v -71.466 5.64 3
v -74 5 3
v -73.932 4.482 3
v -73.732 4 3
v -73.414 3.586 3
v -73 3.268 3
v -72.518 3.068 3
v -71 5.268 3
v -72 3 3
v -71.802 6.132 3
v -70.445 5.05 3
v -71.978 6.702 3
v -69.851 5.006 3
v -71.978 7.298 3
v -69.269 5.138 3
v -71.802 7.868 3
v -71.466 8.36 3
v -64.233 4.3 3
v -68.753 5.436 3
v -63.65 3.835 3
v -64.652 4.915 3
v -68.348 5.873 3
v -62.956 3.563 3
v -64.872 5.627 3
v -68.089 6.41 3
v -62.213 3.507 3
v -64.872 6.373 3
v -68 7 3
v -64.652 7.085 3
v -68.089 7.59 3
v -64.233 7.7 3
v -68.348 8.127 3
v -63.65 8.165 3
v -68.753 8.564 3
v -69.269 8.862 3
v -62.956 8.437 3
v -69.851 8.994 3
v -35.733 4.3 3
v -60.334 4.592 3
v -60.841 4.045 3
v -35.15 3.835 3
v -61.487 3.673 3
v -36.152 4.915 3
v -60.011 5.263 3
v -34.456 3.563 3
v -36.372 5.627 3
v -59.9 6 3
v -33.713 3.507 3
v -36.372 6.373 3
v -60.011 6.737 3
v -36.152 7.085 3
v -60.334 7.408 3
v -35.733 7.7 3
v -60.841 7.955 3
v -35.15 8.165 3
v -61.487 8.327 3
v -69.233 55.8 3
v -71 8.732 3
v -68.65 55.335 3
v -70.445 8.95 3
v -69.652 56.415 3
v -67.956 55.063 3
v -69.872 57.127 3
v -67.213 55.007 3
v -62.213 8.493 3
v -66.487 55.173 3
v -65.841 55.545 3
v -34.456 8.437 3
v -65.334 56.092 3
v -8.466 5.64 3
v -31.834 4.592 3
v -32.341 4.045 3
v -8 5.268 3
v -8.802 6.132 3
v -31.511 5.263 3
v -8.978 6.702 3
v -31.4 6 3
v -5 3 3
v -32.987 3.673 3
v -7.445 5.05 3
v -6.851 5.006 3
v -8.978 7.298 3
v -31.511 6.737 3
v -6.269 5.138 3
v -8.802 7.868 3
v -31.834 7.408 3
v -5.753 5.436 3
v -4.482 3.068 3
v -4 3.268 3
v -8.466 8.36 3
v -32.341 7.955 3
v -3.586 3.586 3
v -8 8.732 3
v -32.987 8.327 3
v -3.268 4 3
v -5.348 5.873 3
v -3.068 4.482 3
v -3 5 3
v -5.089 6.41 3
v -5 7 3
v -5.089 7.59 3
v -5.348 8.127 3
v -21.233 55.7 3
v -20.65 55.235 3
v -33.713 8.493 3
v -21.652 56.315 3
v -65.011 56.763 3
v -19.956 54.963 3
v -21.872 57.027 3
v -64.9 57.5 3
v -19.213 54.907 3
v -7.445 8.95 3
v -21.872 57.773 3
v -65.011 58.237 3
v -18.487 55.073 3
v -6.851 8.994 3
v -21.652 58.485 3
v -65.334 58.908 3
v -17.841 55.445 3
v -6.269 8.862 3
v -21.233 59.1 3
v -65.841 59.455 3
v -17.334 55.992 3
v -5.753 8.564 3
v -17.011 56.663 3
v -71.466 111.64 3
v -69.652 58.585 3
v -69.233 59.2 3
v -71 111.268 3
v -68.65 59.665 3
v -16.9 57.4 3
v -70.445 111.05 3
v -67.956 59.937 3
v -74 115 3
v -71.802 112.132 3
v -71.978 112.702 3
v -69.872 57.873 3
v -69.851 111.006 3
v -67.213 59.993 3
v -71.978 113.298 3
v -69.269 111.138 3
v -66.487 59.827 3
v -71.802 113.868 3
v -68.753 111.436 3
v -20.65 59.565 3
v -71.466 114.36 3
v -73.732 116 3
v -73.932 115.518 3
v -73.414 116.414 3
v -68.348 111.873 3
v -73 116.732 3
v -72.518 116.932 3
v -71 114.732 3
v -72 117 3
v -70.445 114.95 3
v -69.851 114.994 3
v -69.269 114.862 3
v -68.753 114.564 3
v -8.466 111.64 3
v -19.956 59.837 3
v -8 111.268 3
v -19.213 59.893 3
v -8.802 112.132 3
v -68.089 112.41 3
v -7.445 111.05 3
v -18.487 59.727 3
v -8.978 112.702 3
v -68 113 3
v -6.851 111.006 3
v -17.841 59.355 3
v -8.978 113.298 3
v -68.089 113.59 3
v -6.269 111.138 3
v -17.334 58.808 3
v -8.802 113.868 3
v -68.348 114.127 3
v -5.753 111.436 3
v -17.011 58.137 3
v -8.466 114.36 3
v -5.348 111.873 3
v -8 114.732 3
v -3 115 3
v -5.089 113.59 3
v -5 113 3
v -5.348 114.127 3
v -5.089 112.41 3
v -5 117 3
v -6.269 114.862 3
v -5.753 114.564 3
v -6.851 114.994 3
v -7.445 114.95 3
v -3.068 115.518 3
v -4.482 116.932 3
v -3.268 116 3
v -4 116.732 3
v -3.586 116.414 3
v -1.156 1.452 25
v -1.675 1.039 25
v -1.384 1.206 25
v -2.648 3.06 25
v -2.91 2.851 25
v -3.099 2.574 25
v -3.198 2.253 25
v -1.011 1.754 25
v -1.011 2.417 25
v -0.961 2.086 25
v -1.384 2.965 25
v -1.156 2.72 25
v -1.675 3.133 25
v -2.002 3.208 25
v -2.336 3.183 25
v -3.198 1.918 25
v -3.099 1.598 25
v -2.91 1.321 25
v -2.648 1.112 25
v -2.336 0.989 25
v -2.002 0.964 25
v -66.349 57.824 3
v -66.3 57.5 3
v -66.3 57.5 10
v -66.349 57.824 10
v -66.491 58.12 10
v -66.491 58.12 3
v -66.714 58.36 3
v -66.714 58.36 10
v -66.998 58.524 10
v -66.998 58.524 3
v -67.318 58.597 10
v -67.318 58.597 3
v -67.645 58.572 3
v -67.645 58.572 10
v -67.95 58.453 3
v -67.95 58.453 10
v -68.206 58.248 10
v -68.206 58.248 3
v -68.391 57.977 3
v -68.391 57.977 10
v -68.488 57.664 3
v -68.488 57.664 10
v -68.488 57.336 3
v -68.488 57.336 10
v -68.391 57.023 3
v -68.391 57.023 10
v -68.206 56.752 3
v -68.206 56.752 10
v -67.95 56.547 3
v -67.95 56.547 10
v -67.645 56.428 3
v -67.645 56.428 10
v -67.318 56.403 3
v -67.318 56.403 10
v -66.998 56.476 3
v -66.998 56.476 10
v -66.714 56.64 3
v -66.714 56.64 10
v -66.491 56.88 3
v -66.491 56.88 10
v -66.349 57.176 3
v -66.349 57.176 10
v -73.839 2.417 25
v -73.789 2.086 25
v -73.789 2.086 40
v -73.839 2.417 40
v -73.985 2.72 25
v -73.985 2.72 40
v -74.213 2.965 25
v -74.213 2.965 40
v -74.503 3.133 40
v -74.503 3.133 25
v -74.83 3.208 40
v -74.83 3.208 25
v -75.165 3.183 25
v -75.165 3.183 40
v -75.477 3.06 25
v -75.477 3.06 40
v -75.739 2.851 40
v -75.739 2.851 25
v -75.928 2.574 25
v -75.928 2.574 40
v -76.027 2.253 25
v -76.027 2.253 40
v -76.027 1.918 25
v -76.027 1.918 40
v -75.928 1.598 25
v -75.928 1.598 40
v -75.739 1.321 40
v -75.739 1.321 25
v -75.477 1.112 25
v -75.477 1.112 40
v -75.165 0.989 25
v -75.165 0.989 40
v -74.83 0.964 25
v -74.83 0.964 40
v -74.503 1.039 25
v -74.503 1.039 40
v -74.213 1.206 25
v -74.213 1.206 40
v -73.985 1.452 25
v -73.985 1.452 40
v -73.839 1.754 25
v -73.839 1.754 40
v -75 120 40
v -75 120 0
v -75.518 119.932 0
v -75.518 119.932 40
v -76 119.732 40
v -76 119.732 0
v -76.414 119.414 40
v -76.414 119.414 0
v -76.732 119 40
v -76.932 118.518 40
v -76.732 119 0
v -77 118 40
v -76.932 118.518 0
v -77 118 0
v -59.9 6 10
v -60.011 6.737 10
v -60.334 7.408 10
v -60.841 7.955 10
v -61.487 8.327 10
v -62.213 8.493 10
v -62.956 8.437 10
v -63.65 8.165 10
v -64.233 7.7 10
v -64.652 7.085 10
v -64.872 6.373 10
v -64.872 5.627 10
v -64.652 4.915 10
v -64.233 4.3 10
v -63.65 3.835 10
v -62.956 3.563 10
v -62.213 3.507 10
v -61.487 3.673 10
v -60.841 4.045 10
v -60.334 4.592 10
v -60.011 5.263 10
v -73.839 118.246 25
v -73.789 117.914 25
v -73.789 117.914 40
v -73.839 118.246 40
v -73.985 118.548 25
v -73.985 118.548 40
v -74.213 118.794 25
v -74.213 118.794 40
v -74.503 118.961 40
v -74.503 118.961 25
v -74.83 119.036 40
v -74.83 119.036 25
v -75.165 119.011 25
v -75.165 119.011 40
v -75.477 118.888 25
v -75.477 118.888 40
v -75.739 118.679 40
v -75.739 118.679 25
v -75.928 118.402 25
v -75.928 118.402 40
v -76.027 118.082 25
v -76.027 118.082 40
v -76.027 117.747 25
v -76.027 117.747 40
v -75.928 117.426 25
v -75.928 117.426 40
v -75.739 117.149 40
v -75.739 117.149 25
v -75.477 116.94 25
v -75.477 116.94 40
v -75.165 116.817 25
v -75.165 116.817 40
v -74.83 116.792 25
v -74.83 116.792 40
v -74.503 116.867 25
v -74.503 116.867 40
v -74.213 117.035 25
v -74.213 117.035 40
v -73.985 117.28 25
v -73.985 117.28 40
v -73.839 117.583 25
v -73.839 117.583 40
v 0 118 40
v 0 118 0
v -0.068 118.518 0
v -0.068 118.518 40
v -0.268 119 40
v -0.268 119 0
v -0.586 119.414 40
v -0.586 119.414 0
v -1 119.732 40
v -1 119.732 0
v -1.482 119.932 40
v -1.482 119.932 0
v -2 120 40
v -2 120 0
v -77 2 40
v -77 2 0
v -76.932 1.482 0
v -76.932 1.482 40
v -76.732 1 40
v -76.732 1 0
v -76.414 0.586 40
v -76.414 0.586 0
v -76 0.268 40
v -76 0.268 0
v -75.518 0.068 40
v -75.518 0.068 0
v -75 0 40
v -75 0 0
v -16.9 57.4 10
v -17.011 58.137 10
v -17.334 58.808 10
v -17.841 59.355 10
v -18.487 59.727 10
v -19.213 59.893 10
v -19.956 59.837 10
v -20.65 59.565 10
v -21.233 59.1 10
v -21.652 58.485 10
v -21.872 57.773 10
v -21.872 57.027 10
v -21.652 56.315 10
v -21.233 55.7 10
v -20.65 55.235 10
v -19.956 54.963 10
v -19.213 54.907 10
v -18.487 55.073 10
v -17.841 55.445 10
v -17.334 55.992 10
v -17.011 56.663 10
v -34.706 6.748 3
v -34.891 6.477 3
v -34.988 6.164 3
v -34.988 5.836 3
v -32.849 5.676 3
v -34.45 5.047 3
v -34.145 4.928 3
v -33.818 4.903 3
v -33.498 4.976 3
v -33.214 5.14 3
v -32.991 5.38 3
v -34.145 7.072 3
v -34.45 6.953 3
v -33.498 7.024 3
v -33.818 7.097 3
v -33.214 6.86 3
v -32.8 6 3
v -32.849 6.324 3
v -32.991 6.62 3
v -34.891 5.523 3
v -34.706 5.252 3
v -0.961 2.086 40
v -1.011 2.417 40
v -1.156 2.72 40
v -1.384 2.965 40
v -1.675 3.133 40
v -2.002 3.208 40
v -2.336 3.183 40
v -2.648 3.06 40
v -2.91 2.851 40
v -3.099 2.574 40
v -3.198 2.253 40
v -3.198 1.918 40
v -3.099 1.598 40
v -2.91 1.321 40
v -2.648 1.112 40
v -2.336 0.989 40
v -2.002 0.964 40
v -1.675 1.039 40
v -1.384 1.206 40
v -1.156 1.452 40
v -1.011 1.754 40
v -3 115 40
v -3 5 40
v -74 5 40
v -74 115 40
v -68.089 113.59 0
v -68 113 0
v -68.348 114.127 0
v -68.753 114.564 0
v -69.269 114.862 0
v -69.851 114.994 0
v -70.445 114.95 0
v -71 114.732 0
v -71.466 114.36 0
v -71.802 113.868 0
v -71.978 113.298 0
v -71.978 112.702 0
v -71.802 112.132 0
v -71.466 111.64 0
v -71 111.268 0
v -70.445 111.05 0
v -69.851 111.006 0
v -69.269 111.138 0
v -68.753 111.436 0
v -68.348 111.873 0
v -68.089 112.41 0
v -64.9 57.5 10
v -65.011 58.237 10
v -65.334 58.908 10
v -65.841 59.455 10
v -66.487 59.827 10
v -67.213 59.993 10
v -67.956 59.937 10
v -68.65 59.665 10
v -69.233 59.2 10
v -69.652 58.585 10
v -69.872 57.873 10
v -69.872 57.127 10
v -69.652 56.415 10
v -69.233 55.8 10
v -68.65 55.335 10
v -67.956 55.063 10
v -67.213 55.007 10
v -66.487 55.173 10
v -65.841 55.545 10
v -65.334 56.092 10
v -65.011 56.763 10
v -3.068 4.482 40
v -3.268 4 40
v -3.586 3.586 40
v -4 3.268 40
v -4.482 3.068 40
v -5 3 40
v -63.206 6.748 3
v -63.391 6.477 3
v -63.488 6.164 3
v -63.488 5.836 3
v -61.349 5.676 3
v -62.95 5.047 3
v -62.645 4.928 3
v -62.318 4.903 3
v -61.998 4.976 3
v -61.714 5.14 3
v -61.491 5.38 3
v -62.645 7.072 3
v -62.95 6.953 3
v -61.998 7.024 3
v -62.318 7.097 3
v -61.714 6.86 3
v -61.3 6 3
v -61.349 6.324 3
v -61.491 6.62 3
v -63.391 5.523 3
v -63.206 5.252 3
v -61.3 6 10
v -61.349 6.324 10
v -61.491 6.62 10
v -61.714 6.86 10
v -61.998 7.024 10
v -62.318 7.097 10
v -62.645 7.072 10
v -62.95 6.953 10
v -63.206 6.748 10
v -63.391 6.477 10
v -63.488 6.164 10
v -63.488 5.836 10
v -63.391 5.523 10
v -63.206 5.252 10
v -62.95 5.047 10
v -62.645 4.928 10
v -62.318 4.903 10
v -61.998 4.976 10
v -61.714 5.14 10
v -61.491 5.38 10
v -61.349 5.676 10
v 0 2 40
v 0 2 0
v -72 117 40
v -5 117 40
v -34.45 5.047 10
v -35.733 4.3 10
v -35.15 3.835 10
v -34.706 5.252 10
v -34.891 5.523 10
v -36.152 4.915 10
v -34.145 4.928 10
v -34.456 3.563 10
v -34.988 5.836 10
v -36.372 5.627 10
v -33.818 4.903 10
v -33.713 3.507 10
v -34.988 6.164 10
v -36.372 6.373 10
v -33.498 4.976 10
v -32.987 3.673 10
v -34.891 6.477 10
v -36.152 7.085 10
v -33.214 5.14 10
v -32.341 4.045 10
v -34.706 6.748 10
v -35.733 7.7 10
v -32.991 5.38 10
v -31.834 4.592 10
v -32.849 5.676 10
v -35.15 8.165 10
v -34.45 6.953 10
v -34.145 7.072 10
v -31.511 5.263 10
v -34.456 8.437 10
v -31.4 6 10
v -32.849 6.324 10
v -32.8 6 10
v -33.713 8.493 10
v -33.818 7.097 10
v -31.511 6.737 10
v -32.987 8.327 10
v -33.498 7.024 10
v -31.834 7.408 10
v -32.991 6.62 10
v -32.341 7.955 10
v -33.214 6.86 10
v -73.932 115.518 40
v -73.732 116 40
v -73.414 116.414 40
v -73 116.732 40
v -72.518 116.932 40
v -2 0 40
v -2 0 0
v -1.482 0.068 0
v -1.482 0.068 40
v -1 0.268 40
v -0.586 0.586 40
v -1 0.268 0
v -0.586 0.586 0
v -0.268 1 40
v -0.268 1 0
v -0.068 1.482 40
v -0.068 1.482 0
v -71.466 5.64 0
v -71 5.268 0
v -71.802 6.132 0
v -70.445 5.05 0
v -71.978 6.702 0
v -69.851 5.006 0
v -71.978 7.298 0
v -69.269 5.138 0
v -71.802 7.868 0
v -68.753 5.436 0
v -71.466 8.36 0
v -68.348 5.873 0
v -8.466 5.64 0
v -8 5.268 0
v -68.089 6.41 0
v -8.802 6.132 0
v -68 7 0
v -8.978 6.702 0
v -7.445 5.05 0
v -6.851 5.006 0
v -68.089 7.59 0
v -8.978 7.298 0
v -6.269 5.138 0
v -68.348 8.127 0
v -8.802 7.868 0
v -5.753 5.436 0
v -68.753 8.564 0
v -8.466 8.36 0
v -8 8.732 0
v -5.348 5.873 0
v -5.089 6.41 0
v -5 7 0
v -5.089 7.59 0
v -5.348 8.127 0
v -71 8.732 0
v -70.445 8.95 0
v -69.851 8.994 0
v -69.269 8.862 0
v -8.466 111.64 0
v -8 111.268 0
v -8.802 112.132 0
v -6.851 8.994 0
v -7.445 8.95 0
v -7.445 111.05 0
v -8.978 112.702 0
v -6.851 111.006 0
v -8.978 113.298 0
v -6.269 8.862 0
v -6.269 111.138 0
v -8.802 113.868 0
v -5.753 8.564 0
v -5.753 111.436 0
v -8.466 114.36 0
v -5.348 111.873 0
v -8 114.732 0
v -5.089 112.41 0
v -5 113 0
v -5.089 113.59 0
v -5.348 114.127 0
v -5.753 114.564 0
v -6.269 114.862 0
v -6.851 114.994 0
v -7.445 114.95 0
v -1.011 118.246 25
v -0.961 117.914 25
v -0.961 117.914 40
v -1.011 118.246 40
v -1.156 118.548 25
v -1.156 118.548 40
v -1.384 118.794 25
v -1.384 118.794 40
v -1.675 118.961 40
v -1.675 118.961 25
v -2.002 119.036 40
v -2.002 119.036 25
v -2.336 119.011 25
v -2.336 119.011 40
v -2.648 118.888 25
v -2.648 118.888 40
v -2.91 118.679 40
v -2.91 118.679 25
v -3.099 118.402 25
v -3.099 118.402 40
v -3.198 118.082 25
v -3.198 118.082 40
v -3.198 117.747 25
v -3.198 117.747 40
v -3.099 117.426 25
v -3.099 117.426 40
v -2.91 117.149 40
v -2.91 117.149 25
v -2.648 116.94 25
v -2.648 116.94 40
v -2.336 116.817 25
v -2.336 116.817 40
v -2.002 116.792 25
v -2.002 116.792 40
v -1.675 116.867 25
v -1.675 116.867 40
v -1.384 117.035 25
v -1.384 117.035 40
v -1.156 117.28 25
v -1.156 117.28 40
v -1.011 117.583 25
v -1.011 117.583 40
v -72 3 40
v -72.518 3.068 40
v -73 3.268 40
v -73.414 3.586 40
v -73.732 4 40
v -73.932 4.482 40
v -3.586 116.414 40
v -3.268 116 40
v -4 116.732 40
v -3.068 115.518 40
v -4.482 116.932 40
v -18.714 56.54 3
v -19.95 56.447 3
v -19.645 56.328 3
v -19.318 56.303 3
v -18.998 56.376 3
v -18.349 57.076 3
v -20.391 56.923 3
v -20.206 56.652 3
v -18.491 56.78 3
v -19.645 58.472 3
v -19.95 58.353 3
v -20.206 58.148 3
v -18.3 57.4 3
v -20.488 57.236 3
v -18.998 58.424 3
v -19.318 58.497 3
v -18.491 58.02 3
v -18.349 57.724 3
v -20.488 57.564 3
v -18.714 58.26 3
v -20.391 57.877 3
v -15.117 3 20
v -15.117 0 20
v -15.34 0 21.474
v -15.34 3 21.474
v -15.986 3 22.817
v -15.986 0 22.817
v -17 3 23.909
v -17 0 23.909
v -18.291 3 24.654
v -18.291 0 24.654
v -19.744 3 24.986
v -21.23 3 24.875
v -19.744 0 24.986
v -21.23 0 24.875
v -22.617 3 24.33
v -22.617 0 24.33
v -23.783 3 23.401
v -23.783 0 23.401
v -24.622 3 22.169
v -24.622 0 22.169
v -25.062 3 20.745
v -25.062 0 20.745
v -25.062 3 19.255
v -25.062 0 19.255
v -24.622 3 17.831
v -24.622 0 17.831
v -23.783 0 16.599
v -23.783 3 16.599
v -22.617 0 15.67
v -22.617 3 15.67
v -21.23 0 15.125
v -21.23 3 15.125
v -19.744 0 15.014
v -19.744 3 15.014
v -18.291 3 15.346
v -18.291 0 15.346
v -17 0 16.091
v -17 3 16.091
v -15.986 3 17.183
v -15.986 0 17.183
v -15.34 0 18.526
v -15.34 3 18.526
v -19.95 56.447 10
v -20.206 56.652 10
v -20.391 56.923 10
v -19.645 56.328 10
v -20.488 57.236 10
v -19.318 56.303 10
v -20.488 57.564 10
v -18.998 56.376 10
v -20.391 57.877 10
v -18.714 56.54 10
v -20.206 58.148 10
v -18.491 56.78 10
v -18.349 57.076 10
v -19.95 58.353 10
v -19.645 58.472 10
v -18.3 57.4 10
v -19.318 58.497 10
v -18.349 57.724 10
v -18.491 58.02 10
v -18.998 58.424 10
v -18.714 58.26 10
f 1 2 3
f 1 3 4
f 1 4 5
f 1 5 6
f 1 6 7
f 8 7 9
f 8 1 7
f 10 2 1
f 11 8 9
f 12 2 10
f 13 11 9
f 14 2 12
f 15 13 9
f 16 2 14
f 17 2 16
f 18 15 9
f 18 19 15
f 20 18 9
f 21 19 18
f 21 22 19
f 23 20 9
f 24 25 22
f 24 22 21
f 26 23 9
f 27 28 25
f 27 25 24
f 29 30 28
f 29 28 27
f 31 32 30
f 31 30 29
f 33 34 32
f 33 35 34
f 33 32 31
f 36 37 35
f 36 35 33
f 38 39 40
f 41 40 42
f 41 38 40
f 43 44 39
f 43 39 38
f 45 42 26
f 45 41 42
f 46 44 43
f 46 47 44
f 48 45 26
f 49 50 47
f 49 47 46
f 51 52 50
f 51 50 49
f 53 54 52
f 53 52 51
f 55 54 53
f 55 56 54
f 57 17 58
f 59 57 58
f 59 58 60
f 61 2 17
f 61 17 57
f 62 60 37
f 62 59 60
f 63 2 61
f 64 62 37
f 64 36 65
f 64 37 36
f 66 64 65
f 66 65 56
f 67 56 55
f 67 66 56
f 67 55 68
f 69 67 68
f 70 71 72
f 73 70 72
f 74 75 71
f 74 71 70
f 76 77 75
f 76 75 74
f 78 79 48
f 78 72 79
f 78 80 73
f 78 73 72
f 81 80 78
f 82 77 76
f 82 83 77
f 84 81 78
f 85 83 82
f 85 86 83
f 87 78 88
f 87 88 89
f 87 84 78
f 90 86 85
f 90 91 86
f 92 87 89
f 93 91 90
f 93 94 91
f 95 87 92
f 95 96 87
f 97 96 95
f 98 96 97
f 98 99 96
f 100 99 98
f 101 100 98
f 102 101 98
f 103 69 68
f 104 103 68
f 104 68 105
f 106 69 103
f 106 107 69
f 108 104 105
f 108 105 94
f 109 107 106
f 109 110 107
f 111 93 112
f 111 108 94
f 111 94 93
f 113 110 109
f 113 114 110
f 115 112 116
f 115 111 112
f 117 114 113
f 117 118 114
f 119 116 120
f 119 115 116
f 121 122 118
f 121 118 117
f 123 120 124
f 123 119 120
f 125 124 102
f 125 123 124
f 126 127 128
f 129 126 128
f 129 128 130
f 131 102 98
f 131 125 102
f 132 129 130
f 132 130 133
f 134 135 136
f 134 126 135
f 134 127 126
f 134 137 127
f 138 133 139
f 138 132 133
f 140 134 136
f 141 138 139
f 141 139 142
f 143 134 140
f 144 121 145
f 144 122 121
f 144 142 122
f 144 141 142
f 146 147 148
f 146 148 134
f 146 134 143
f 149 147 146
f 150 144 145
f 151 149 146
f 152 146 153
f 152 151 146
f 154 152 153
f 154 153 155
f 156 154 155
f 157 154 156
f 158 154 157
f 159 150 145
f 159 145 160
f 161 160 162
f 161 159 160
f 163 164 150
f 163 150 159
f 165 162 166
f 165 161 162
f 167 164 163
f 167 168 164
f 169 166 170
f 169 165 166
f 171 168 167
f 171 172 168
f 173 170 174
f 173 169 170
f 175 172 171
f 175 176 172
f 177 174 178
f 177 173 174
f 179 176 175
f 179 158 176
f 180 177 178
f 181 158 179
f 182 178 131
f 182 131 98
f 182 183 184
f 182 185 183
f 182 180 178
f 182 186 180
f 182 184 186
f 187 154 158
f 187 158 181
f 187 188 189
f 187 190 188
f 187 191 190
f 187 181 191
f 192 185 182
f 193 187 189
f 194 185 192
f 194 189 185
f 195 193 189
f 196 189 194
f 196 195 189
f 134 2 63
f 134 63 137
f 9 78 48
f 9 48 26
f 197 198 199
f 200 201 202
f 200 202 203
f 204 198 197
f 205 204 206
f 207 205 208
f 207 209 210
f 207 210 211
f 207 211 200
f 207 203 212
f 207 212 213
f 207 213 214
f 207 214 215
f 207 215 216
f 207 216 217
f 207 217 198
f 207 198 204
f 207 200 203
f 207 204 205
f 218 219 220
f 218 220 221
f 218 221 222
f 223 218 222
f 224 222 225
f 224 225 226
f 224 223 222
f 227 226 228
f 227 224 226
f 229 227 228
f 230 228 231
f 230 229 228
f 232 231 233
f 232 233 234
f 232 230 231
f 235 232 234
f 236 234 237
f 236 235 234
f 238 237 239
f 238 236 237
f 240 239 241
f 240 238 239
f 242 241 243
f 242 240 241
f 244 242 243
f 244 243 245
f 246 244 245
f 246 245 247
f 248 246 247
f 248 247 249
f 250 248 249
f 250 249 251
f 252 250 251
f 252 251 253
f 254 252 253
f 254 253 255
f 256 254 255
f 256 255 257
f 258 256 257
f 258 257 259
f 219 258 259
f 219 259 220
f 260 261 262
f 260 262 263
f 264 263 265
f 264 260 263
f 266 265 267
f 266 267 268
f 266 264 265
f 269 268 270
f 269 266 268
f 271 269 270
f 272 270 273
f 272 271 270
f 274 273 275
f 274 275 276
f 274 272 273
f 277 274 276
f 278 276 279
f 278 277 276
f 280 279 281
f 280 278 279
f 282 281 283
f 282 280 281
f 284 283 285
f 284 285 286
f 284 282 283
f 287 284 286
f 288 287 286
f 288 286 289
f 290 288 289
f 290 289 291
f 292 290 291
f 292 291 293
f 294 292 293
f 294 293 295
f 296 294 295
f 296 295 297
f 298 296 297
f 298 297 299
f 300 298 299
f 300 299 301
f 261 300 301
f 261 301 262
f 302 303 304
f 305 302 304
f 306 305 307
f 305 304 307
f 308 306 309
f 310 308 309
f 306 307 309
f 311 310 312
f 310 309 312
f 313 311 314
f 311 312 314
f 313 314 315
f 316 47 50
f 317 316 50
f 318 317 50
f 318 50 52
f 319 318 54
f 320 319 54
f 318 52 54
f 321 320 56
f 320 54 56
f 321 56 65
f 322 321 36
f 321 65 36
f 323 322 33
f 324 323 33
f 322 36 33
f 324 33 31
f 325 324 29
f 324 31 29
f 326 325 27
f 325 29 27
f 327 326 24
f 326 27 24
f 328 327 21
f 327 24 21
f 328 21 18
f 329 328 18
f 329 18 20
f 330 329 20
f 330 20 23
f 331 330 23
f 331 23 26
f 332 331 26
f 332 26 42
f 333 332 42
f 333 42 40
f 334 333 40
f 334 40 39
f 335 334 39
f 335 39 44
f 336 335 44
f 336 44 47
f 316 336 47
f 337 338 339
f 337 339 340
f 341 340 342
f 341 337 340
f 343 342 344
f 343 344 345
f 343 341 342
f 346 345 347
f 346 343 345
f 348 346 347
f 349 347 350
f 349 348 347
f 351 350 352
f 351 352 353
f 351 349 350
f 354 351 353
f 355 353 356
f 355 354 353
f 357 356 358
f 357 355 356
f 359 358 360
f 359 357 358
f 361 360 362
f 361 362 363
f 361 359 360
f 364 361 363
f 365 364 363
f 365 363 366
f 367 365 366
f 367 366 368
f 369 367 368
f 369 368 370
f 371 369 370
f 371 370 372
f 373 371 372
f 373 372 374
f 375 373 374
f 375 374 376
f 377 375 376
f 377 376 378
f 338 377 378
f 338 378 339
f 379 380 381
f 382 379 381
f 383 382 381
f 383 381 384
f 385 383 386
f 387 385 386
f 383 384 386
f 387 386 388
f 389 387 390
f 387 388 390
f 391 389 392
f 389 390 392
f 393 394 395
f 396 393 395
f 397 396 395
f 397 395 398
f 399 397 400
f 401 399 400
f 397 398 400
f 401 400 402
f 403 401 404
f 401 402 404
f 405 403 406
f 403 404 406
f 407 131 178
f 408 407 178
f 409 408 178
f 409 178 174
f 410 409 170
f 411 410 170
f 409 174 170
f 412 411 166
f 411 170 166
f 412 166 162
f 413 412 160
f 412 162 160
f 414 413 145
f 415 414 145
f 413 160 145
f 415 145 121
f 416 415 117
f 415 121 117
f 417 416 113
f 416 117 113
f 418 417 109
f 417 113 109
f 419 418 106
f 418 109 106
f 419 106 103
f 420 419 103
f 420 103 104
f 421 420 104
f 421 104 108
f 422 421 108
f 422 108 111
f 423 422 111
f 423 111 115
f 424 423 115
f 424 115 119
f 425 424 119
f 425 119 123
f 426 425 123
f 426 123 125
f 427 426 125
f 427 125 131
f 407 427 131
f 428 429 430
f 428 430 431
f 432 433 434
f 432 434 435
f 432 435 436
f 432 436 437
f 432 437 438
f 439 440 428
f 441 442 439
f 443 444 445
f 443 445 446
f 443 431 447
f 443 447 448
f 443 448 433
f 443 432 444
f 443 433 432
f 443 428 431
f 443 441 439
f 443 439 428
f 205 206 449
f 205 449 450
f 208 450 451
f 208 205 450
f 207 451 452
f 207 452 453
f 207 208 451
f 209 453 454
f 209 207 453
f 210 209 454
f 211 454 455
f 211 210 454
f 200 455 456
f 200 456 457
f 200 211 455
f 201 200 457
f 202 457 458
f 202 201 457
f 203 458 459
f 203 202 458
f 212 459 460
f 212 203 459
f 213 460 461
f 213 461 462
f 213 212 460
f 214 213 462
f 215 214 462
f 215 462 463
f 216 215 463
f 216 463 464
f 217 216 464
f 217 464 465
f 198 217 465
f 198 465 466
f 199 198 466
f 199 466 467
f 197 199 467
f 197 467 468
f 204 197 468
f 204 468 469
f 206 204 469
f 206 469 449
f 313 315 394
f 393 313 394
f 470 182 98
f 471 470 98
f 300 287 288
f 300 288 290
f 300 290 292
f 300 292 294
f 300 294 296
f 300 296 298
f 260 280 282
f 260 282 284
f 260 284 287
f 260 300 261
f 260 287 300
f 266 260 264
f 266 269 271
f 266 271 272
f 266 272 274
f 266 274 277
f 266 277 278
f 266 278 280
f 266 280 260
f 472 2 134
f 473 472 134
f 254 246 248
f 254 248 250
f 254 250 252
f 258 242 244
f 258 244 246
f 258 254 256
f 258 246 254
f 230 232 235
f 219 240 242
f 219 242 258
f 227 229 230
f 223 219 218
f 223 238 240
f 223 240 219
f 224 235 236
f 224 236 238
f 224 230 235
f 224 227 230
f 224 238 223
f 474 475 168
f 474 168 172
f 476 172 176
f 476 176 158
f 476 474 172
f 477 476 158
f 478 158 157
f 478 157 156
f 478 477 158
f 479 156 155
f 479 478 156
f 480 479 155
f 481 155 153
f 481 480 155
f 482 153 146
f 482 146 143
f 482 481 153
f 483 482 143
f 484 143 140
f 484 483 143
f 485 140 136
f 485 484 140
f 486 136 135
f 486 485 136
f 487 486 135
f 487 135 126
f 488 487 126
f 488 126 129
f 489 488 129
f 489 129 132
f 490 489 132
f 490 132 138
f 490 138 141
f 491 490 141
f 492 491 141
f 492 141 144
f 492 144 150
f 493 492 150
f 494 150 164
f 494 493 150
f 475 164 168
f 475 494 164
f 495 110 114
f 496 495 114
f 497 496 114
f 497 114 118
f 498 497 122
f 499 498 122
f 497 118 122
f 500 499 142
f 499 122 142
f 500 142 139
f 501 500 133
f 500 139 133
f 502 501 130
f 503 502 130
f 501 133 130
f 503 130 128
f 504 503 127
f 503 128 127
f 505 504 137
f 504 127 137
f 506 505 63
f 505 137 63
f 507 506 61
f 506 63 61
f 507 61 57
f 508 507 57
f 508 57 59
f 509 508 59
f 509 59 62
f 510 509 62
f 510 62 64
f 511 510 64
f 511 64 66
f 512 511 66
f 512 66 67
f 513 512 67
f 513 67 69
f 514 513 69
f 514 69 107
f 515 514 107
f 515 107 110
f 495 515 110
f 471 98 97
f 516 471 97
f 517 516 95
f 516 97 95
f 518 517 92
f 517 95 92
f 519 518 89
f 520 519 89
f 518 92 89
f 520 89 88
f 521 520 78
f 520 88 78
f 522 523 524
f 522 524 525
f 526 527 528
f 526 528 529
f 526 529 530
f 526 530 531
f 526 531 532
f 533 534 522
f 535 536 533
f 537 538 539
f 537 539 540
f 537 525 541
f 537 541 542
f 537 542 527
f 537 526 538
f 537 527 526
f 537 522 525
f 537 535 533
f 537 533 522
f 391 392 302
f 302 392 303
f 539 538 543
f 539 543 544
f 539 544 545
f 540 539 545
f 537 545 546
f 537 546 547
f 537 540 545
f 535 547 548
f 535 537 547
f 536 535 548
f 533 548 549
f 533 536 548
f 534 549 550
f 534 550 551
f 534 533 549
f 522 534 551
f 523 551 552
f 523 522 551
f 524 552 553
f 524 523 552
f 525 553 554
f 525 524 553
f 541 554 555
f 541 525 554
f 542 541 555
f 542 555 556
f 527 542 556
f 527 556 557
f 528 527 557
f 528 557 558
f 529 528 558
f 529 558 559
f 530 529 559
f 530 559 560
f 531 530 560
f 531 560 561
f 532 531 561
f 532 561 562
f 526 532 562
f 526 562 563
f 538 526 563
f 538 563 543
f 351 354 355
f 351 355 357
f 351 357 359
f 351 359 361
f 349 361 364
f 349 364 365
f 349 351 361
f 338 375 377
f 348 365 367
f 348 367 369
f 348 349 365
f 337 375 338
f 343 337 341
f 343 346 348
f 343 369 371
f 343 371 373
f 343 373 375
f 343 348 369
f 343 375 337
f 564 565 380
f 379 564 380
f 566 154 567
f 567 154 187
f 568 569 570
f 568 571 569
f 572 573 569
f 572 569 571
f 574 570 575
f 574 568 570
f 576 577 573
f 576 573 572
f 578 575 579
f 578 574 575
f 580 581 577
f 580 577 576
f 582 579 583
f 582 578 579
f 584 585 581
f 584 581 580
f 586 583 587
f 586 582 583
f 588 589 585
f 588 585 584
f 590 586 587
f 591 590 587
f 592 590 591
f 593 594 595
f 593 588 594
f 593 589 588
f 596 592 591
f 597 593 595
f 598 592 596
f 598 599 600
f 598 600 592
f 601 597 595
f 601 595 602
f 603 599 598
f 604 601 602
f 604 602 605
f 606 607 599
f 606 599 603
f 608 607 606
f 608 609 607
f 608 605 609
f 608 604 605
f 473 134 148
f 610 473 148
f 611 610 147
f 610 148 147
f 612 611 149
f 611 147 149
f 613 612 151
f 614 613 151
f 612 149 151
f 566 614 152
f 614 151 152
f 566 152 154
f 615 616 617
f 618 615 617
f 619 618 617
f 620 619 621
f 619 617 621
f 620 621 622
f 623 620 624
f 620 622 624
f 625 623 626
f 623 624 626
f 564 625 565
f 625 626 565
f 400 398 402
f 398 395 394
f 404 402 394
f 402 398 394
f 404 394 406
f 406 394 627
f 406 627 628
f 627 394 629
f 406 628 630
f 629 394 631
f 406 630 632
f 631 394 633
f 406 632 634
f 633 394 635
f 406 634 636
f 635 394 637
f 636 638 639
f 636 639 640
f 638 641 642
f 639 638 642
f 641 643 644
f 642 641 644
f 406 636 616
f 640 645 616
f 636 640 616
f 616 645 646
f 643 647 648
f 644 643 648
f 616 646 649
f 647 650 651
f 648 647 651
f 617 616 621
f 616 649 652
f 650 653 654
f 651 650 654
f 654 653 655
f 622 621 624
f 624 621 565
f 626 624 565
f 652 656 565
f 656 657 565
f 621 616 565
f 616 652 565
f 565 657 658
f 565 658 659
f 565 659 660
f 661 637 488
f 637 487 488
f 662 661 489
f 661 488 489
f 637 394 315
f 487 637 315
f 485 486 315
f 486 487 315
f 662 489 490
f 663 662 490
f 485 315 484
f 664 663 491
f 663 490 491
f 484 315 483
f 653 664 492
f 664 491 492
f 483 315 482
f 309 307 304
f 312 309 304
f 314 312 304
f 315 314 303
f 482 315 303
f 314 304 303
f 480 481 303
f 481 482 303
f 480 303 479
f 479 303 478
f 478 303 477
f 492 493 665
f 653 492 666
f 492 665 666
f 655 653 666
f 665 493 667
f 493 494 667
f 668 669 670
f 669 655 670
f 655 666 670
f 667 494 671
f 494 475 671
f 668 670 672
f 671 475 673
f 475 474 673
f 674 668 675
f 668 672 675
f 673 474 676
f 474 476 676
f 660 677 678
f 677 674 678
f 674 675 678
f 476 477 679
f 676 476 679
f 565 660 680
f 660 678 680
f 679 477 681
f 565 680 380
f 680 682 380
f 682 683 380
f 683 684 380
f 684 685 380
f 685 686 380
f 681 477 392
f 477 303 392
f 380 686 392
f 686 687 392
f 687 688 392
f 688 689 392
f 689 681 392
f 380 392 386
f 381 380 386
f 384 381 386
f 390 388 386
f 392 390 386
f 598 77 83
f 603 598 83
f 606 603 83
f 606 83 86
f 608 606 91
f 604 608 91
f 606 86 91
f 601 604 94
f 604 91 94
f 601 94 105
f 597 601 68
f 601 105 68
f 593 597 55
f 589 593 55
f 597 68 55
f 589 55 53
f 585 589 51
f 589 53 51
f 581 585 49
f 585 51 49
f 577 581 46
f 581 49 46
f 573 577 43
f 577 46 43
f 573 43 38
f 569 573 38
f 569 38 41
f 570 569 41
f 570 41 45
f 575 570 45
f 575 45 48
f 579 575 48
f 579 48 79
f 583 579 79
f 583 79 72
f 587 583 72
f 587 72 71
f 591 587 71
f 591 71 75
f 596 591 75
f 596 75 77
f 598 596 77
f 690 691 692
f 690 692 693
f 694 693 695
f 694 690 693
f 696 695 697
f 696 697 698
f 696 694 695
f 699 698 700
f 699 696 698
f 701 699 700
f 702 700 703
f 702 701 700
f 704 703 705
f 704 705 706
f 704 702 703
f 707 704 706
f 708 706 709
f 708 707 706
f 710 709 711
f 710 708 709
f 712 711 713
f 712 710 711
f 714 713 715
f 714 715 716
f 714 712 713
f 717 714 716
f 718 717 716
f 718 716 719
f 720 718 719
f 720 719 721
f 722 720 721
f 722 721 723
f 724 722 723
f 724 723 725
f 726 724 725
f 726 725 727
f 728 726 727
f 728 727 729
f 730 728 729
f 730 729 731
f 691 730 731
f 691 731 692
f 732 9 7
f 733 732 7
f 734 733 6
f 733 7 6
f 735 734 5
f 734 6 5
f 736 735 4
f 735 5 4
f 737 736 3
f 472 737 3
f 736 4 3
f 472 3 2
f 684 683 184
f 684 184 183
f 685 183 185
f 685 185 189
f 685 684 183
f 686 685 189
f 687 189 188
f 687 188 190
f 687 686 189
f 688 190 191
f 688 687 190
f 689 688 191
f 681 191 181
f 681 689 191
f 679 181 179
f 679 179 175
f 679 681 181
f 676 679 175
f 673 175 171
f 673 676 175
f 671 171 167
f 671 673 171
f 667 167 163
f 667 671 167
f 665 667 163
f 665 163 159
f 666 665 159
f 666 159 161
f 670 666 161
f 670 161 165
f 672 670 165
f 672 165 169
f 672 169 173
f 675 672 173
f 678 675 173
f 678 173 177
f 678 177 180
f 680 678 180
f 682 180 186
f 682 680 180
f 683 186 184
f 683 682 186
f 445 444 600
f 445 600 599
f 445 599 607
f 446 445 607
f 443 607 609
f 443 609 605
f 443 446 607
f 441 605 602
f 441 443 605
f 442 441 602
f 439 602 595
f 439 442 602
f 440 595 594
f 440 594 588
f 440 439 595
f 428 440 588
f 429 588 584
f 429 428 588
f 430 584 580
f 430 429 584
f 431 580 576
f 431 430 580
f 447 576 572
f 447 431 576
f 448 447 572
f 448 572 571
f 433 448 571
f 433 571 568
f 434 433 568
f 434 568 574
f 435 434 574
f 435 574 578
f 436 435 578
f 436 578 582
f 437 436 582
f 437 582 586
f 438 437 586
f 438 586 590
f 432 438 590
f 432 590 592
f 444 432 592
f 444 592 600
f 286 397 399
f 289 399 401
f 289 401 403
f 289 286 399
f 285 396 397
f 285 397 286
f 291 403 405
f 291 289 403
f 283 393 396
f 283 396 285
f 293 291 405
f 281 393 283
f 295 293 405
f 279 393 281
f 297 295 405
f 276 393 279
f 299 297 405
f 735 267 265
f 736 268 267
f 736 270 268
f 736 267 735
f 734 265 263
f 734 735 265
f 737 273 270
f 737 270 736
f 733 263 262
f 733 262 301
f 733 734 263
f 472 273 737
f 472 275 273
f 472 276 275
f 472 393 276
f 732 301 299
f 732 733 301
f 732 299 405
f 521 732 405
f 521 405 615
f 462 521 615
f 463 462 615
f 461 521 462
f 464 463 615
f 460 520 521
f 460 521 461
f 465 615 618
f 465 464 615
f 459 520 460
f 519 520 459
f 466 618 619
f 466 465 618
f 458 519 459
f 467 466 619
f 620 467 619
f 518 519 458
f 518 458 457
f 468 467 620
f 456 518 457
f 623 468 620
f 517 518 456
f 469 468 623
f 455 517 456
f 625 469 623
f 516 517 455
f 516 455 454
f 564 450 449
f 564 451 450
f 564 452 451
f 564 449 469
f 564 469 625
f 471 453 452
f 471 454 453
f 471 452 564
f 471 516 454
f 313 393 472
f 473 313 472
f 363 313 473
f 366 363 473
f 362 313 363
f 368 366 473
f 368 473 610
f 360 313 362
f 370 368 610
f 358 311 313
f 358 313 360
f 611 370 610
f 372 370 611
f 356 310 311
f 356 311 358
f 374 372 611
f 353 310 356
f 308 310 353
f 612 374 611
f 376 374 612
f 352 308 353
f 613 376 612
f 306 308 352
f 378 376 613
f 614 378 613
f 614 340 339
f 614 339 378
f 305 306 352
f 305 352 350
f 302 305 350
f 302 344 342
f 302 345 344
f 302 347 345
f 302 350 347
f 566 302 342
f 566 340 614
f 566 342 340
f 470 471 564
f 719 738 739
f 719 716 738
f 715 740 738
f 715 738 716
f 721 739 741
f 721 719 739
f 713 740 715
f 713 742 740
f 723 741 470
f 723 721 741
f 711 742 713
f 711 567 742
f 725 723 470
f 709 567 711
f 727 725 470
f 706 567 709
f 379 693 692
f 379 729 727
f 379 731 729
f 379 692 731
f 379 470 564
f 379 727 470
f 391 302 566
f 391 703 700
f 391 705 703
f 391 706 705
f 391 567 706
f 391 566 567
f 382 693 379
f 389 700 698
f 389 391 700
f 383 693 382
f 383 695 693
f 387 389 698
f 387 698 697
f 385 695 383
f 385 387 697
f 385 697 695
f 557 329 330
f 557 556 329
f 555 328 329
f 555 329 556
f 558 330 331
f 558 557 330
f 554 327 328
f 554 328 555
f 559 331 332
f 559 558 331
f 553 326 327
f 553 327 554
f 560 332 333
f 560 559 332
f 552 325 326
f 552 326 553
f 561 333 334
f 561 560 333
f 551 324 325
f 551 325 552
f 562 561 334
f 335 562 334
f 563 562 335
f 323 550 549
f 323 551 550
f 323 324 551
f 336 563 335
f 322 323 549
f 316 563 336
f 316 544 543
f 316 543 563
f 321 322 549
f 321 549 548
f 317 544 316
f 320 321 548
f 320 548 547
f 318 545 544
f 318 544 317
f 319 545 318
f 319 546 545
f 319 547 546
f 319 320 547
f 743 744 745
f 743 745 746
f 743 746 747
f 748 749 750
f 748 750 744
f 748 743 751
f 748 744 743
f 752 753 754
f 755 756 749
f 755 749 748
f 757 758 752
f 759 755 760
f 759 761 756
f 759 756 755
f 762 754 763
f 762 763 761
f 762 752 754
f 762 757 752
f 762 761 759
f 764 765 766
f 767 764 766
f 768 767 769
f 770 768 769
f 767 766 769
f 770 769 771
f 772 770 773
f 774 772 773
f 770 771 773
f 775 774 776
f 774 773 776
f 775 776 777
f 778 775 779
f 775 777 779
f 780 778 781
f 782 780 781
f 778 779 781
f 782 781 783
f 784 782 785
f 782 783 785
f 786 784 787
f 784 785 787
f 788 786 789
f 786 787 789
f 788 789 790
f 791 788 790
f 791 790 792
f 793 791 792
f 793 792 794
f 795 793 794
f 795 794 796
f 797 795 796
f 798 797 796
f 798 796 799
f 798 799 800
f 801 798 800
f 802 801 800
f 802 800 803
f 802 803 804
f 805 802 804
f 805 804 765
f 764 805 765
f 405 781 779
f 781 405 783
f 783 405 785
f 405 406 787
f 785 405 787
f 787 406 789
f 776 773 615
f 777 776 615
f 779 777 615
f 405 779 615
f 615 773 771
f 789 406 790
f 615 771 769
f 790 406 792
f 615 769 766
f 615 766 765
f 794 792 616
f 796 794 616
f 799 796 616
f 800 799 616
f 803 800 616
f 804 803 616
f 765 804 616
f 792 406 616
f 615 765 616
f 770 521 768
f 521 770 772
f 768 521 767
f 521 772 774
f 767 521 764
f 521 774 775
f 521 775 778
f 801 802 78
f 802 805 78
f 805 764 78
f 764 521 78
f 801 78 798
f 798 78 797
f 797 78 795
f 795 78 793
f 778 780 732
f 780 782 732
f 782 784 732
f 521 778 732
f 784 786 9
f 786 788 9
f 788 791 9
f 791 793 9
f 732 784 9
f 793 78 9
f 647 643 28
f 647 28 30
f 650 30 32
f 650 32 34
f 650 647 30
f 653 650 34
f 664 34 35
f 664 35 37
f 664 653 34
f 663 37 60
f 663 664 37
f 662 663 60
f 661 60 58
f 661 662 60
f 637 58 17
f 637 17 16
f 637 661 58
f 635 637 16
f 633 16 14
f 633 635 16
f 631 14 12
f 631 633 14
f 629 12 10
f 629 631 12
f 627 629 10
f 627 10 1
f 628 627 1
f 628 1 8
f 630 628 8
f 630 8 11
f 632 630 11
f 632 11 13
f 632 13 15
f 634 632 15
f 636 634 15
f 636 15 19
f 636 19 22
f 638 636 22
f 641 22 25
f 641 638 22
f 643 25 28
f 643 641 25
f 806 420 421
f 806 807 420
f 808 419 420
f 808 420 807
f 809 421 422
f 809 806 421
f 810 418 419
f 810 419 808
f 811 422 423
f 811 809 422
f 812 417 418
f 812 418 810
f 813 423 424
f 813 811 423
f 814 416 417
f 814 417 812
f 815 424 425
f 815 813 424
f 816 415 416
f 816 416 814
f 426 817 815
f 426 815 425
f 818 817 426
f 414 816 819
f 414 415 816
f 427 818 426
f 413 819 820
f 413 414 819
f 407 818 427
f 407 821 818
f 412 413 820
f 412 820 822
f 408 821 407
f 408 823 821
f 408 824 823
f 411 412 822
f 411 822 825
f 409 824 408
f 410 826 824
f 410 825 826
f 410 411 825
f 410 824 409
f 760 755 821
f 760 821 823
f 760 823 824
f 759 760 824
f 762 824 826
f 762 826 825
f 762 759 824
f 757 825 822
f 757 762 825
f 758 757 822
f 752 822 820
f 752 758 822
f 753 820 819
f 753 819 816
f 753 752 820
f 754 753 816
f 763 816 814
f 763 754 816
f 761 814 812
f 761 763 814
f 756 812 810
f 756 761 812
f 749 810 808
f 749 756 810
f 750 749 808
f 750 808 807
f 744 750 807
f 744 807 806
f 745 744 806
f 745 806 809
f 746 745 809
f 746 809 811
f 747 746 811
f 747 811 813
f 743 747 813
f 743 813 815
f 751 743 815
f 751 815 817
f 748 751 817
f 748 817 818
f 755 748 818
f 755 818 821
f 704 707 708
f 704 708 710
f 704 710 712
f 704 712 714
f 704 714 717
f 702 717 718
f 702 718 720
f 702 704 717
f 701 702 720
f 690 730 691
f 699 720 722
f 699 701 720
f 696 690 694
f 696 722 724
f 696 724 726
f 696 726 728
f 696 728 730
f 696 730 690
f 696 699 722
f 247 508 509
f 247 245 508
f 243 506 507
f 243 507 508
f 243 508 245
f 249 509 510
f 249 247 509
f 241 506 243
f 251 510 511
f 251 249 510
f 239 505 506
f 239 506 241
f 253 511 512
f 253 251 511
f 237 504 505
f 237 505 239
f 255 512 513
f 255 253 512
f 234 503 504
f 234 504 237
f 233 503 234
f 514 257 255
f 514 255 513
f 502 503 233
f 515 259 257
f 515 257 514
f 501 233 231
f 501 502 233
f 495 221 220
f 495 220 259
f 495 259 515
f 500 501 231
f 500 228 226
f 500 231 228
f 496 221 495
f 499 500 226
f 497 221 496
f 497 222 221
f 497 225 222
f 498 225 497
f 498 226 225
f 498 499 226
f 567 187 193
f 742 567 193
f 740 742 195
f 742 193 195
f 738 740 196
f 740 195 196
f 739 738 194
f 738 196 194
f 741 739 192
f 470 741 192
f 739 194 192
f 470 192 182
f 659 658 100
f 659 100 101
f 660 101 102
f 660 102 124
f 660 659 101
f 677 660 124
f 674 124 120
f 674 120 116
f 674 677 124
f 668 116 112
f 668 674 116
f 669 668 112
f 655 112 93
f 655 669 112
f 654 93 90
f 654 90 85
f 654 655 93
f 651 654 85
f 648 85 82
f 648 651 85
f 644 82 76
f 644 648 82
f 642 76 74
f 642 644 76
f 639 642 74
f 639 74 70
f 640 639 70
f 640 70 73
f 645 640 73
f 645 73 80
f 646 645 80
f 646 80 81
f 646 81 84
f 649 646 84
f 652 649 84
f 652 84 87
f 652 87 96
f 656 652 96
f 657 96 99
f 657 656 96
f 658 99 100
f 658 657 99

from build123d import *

# Parameters (mm, degrees)
F0_R     = 1.125
F1_DEPTH = 40
F0_R_2   = 2
F0_R_3   = 2.5
F2_DEPTH = 3
F0_R_4   = 1.1
F3_DEPTH = 10
F4_DEPTH = 3
F5_R     = 5
F6_DEPTH = 4
F7_DEPTH = 25


with BuildPart() as f1:
    # F0 (on Top) → F1 (new body)
    with BuildSketch(Plane.XY):
        with BuildLine():
            Line((-2, 120), (-75, 120))
            ThreePointArc((-75, 120), (-76.414214, 119.414214), (-77, 118))
            Line((-77, 118), (-77, 2))
            ThreePointArc((-77, 2), (-76.414214, 0.585786), (-75, 0))
            Line((-75, 0), (-2, 0))
            ThreePointArc((-2, 0), (-0.585786, 0.585786), (0, 2))
            Line((0, 2), (0, 118))
            ThreePointArc((0, 118), (-0.585786, 119.414214), (-2, 120))
        make_face()
        with Locations((-74.914214, 2.085786)):
            Circle(F0_R, mode=Mode.SUBTRACT)
        with Locations((-2.085786, 2.085786)):
            Circle(F0_R, mode=Mode.SUBTRACT)
        with BuildLine():
            Line((-72, 117), (-38.5, 117))
            Line((-38.5, 117), (-5, 117))
            ThreePointArc((-5, 117), (-3.585786, 116.414214), (-3, 115))
            Line((-3, 115), (-3, 60))
            Line((-3, 60), (-3, 5))
            ThreePointArc((-3, 5), (-3.585786, 3.585786), (-5, 3))
            Line((-5, 3), (-38.5, 3))
            Line((-38.5, 3), (-72, 3))
            ThreePointArc((-72, 3), (-73.414214, 3.585786), (-74, 5))
            Line((-74, 5), (-74, 60))
            Line((-74, 60), (-74, 115))
            ThreePointArc((-74, 115), (-73.414214, 116.414214), (-72, 117))
        make_face(mode=Mode.SUBTRACT)
        with Locations((-74.914214, 117.914214)):
            Circle(F0_R, mode=Mode.SUBTRACT)
        with Locations((-2.085786, 117.914214)):
            Circle(F0_R, mode=Mode.SUBTRACT)
    extrude(amount=F1_DEPTH)

    # F0 (on Top) → F2 (join)
    with BuildSketch(Plane.XY):
        with BuildLine():
            Line((-5, 117), (-38.5, 117))
            Line((-38.5, 117), (-72, 117))
            ThreePointArc((-72, 117), (-73.414214, 116.414214), (-74, 115))
            Line((-74, 115), (-74, 60))
            Line((-74, 60), (-74, 5))
            ThreePointArc((-74, 5), (-73.414214, 3.585786), (-72, 3))
            Line((-72, 3), (-38.5, 3))
            Line((-38.5, 3), (-5, 3))
            ThreePointArc((-5, 3), (-3.585786, 3.585786), (-3, 5))
            Line((-3, 5), (-3, 60))
            Line((-3, 60), (-3, 115))
            ThreePointArc((-3, 115), (-3.585786, 116.414214), (-5, 117))
        make_face()
        with Locations((-70, 7)):
            Circle(F0_R_2, mode=Mode.SUBTRACT)
        with Locations((-62.4, 6)):
            Circle(F0_R_3, mode=Mode.SUBTRACT)
        with Locations((-67.4, 57.5)):
            Circle(F0_R_3, mode=Mode.SUBTRACT)
        with Locations((-33.9, 6)):
            Circle(F0_R_3, mode=Mode.SUBTRACT)
        with Locations((-7, 7)):
            Circle(F0_R_2, mode=Mode.SUBTRACT)
        with Locations((-19.4, 57.4)):
            Circle(F0_R_3, mode=Mode.SUBTRACT)
        with Locations((-70, 113)):
            Circle(F0_R_2, mode=Mode.SUBTRACT)
        with Locations((-7, 113)):
            Circle(F0_R_2, mode=Mode.SUBTRACT)
    extrude(amount=F2_DEPTH)

    # F0 (on Top) → F3 (join)
    with BuildSketch(Plane.XY):
        with Locations((-67.4, 57.5)):
            Circle(F0_R_3)
        with Locations((-67.4, 57.5)):
            Circle(F0_R_4, mode=Mode.SUBTRACT)
        with Locations((-19.4, 57.4)):
            Circle(F0_R_3)
        with Locations((-19.4, 57.4)):
            Circle(F0_R_4, mode=Mode.SUBTRACT)
        with Locations((-33.9, 6)):
            Circle(F0_R_3)
        with Locations((-33.9, 6)):
            Circle(F0_R_4, mode=Mode.SUBTRACT)
        with Locations((-62.4, 6)):
            Circle(F0_R_3)
        with Locations((-62.4, 6)):
            Circle(F0_R_4, mode=Mode.SUBTRACT)
    extrude(amount=F3_DEPTH)

    # F0 (on Top) → F4 (join)
    with BuildSketch(Plane.XY):
        with Locations((-67.4, 57.5)):
            Circle(F0_R_4)
        with Locations((-19.4, 57.4)):
            Circle(F0_R_4)
        with Locations((-33.9, 6)):
            Circle(F0_R_4)
        with Locations((-62.4, 6)):
            Circle(F0_R_4)
    extrude(amount=F4_DEPTH)

    # F5 (on Front) → F6 (cut)
    with BuildSketch(Plane.XZ):
        with Locations((-20.117393, 20)):
            Circle(F5_R)
    extrude(amount=-F6_DEPTH, mode=Mode.SUBTRACT)

    # F0 (on Top) → F7 (join)
    with BuildSketch(Plane.XY):
        with Locations((-74.914214, 117.914214)):
            Circle(F0_R)
        with Locations((-2.085786, 117.914214)):
            Circle(F0_R)
        with Locations((-2.085786, 2.085786)):
            Circle(F0_R)
        with Locations((-74.914214, 2.085786)):
            Circle(F0_R)
    extrude(amount=F7_DEPTH)


solid = f1.part
